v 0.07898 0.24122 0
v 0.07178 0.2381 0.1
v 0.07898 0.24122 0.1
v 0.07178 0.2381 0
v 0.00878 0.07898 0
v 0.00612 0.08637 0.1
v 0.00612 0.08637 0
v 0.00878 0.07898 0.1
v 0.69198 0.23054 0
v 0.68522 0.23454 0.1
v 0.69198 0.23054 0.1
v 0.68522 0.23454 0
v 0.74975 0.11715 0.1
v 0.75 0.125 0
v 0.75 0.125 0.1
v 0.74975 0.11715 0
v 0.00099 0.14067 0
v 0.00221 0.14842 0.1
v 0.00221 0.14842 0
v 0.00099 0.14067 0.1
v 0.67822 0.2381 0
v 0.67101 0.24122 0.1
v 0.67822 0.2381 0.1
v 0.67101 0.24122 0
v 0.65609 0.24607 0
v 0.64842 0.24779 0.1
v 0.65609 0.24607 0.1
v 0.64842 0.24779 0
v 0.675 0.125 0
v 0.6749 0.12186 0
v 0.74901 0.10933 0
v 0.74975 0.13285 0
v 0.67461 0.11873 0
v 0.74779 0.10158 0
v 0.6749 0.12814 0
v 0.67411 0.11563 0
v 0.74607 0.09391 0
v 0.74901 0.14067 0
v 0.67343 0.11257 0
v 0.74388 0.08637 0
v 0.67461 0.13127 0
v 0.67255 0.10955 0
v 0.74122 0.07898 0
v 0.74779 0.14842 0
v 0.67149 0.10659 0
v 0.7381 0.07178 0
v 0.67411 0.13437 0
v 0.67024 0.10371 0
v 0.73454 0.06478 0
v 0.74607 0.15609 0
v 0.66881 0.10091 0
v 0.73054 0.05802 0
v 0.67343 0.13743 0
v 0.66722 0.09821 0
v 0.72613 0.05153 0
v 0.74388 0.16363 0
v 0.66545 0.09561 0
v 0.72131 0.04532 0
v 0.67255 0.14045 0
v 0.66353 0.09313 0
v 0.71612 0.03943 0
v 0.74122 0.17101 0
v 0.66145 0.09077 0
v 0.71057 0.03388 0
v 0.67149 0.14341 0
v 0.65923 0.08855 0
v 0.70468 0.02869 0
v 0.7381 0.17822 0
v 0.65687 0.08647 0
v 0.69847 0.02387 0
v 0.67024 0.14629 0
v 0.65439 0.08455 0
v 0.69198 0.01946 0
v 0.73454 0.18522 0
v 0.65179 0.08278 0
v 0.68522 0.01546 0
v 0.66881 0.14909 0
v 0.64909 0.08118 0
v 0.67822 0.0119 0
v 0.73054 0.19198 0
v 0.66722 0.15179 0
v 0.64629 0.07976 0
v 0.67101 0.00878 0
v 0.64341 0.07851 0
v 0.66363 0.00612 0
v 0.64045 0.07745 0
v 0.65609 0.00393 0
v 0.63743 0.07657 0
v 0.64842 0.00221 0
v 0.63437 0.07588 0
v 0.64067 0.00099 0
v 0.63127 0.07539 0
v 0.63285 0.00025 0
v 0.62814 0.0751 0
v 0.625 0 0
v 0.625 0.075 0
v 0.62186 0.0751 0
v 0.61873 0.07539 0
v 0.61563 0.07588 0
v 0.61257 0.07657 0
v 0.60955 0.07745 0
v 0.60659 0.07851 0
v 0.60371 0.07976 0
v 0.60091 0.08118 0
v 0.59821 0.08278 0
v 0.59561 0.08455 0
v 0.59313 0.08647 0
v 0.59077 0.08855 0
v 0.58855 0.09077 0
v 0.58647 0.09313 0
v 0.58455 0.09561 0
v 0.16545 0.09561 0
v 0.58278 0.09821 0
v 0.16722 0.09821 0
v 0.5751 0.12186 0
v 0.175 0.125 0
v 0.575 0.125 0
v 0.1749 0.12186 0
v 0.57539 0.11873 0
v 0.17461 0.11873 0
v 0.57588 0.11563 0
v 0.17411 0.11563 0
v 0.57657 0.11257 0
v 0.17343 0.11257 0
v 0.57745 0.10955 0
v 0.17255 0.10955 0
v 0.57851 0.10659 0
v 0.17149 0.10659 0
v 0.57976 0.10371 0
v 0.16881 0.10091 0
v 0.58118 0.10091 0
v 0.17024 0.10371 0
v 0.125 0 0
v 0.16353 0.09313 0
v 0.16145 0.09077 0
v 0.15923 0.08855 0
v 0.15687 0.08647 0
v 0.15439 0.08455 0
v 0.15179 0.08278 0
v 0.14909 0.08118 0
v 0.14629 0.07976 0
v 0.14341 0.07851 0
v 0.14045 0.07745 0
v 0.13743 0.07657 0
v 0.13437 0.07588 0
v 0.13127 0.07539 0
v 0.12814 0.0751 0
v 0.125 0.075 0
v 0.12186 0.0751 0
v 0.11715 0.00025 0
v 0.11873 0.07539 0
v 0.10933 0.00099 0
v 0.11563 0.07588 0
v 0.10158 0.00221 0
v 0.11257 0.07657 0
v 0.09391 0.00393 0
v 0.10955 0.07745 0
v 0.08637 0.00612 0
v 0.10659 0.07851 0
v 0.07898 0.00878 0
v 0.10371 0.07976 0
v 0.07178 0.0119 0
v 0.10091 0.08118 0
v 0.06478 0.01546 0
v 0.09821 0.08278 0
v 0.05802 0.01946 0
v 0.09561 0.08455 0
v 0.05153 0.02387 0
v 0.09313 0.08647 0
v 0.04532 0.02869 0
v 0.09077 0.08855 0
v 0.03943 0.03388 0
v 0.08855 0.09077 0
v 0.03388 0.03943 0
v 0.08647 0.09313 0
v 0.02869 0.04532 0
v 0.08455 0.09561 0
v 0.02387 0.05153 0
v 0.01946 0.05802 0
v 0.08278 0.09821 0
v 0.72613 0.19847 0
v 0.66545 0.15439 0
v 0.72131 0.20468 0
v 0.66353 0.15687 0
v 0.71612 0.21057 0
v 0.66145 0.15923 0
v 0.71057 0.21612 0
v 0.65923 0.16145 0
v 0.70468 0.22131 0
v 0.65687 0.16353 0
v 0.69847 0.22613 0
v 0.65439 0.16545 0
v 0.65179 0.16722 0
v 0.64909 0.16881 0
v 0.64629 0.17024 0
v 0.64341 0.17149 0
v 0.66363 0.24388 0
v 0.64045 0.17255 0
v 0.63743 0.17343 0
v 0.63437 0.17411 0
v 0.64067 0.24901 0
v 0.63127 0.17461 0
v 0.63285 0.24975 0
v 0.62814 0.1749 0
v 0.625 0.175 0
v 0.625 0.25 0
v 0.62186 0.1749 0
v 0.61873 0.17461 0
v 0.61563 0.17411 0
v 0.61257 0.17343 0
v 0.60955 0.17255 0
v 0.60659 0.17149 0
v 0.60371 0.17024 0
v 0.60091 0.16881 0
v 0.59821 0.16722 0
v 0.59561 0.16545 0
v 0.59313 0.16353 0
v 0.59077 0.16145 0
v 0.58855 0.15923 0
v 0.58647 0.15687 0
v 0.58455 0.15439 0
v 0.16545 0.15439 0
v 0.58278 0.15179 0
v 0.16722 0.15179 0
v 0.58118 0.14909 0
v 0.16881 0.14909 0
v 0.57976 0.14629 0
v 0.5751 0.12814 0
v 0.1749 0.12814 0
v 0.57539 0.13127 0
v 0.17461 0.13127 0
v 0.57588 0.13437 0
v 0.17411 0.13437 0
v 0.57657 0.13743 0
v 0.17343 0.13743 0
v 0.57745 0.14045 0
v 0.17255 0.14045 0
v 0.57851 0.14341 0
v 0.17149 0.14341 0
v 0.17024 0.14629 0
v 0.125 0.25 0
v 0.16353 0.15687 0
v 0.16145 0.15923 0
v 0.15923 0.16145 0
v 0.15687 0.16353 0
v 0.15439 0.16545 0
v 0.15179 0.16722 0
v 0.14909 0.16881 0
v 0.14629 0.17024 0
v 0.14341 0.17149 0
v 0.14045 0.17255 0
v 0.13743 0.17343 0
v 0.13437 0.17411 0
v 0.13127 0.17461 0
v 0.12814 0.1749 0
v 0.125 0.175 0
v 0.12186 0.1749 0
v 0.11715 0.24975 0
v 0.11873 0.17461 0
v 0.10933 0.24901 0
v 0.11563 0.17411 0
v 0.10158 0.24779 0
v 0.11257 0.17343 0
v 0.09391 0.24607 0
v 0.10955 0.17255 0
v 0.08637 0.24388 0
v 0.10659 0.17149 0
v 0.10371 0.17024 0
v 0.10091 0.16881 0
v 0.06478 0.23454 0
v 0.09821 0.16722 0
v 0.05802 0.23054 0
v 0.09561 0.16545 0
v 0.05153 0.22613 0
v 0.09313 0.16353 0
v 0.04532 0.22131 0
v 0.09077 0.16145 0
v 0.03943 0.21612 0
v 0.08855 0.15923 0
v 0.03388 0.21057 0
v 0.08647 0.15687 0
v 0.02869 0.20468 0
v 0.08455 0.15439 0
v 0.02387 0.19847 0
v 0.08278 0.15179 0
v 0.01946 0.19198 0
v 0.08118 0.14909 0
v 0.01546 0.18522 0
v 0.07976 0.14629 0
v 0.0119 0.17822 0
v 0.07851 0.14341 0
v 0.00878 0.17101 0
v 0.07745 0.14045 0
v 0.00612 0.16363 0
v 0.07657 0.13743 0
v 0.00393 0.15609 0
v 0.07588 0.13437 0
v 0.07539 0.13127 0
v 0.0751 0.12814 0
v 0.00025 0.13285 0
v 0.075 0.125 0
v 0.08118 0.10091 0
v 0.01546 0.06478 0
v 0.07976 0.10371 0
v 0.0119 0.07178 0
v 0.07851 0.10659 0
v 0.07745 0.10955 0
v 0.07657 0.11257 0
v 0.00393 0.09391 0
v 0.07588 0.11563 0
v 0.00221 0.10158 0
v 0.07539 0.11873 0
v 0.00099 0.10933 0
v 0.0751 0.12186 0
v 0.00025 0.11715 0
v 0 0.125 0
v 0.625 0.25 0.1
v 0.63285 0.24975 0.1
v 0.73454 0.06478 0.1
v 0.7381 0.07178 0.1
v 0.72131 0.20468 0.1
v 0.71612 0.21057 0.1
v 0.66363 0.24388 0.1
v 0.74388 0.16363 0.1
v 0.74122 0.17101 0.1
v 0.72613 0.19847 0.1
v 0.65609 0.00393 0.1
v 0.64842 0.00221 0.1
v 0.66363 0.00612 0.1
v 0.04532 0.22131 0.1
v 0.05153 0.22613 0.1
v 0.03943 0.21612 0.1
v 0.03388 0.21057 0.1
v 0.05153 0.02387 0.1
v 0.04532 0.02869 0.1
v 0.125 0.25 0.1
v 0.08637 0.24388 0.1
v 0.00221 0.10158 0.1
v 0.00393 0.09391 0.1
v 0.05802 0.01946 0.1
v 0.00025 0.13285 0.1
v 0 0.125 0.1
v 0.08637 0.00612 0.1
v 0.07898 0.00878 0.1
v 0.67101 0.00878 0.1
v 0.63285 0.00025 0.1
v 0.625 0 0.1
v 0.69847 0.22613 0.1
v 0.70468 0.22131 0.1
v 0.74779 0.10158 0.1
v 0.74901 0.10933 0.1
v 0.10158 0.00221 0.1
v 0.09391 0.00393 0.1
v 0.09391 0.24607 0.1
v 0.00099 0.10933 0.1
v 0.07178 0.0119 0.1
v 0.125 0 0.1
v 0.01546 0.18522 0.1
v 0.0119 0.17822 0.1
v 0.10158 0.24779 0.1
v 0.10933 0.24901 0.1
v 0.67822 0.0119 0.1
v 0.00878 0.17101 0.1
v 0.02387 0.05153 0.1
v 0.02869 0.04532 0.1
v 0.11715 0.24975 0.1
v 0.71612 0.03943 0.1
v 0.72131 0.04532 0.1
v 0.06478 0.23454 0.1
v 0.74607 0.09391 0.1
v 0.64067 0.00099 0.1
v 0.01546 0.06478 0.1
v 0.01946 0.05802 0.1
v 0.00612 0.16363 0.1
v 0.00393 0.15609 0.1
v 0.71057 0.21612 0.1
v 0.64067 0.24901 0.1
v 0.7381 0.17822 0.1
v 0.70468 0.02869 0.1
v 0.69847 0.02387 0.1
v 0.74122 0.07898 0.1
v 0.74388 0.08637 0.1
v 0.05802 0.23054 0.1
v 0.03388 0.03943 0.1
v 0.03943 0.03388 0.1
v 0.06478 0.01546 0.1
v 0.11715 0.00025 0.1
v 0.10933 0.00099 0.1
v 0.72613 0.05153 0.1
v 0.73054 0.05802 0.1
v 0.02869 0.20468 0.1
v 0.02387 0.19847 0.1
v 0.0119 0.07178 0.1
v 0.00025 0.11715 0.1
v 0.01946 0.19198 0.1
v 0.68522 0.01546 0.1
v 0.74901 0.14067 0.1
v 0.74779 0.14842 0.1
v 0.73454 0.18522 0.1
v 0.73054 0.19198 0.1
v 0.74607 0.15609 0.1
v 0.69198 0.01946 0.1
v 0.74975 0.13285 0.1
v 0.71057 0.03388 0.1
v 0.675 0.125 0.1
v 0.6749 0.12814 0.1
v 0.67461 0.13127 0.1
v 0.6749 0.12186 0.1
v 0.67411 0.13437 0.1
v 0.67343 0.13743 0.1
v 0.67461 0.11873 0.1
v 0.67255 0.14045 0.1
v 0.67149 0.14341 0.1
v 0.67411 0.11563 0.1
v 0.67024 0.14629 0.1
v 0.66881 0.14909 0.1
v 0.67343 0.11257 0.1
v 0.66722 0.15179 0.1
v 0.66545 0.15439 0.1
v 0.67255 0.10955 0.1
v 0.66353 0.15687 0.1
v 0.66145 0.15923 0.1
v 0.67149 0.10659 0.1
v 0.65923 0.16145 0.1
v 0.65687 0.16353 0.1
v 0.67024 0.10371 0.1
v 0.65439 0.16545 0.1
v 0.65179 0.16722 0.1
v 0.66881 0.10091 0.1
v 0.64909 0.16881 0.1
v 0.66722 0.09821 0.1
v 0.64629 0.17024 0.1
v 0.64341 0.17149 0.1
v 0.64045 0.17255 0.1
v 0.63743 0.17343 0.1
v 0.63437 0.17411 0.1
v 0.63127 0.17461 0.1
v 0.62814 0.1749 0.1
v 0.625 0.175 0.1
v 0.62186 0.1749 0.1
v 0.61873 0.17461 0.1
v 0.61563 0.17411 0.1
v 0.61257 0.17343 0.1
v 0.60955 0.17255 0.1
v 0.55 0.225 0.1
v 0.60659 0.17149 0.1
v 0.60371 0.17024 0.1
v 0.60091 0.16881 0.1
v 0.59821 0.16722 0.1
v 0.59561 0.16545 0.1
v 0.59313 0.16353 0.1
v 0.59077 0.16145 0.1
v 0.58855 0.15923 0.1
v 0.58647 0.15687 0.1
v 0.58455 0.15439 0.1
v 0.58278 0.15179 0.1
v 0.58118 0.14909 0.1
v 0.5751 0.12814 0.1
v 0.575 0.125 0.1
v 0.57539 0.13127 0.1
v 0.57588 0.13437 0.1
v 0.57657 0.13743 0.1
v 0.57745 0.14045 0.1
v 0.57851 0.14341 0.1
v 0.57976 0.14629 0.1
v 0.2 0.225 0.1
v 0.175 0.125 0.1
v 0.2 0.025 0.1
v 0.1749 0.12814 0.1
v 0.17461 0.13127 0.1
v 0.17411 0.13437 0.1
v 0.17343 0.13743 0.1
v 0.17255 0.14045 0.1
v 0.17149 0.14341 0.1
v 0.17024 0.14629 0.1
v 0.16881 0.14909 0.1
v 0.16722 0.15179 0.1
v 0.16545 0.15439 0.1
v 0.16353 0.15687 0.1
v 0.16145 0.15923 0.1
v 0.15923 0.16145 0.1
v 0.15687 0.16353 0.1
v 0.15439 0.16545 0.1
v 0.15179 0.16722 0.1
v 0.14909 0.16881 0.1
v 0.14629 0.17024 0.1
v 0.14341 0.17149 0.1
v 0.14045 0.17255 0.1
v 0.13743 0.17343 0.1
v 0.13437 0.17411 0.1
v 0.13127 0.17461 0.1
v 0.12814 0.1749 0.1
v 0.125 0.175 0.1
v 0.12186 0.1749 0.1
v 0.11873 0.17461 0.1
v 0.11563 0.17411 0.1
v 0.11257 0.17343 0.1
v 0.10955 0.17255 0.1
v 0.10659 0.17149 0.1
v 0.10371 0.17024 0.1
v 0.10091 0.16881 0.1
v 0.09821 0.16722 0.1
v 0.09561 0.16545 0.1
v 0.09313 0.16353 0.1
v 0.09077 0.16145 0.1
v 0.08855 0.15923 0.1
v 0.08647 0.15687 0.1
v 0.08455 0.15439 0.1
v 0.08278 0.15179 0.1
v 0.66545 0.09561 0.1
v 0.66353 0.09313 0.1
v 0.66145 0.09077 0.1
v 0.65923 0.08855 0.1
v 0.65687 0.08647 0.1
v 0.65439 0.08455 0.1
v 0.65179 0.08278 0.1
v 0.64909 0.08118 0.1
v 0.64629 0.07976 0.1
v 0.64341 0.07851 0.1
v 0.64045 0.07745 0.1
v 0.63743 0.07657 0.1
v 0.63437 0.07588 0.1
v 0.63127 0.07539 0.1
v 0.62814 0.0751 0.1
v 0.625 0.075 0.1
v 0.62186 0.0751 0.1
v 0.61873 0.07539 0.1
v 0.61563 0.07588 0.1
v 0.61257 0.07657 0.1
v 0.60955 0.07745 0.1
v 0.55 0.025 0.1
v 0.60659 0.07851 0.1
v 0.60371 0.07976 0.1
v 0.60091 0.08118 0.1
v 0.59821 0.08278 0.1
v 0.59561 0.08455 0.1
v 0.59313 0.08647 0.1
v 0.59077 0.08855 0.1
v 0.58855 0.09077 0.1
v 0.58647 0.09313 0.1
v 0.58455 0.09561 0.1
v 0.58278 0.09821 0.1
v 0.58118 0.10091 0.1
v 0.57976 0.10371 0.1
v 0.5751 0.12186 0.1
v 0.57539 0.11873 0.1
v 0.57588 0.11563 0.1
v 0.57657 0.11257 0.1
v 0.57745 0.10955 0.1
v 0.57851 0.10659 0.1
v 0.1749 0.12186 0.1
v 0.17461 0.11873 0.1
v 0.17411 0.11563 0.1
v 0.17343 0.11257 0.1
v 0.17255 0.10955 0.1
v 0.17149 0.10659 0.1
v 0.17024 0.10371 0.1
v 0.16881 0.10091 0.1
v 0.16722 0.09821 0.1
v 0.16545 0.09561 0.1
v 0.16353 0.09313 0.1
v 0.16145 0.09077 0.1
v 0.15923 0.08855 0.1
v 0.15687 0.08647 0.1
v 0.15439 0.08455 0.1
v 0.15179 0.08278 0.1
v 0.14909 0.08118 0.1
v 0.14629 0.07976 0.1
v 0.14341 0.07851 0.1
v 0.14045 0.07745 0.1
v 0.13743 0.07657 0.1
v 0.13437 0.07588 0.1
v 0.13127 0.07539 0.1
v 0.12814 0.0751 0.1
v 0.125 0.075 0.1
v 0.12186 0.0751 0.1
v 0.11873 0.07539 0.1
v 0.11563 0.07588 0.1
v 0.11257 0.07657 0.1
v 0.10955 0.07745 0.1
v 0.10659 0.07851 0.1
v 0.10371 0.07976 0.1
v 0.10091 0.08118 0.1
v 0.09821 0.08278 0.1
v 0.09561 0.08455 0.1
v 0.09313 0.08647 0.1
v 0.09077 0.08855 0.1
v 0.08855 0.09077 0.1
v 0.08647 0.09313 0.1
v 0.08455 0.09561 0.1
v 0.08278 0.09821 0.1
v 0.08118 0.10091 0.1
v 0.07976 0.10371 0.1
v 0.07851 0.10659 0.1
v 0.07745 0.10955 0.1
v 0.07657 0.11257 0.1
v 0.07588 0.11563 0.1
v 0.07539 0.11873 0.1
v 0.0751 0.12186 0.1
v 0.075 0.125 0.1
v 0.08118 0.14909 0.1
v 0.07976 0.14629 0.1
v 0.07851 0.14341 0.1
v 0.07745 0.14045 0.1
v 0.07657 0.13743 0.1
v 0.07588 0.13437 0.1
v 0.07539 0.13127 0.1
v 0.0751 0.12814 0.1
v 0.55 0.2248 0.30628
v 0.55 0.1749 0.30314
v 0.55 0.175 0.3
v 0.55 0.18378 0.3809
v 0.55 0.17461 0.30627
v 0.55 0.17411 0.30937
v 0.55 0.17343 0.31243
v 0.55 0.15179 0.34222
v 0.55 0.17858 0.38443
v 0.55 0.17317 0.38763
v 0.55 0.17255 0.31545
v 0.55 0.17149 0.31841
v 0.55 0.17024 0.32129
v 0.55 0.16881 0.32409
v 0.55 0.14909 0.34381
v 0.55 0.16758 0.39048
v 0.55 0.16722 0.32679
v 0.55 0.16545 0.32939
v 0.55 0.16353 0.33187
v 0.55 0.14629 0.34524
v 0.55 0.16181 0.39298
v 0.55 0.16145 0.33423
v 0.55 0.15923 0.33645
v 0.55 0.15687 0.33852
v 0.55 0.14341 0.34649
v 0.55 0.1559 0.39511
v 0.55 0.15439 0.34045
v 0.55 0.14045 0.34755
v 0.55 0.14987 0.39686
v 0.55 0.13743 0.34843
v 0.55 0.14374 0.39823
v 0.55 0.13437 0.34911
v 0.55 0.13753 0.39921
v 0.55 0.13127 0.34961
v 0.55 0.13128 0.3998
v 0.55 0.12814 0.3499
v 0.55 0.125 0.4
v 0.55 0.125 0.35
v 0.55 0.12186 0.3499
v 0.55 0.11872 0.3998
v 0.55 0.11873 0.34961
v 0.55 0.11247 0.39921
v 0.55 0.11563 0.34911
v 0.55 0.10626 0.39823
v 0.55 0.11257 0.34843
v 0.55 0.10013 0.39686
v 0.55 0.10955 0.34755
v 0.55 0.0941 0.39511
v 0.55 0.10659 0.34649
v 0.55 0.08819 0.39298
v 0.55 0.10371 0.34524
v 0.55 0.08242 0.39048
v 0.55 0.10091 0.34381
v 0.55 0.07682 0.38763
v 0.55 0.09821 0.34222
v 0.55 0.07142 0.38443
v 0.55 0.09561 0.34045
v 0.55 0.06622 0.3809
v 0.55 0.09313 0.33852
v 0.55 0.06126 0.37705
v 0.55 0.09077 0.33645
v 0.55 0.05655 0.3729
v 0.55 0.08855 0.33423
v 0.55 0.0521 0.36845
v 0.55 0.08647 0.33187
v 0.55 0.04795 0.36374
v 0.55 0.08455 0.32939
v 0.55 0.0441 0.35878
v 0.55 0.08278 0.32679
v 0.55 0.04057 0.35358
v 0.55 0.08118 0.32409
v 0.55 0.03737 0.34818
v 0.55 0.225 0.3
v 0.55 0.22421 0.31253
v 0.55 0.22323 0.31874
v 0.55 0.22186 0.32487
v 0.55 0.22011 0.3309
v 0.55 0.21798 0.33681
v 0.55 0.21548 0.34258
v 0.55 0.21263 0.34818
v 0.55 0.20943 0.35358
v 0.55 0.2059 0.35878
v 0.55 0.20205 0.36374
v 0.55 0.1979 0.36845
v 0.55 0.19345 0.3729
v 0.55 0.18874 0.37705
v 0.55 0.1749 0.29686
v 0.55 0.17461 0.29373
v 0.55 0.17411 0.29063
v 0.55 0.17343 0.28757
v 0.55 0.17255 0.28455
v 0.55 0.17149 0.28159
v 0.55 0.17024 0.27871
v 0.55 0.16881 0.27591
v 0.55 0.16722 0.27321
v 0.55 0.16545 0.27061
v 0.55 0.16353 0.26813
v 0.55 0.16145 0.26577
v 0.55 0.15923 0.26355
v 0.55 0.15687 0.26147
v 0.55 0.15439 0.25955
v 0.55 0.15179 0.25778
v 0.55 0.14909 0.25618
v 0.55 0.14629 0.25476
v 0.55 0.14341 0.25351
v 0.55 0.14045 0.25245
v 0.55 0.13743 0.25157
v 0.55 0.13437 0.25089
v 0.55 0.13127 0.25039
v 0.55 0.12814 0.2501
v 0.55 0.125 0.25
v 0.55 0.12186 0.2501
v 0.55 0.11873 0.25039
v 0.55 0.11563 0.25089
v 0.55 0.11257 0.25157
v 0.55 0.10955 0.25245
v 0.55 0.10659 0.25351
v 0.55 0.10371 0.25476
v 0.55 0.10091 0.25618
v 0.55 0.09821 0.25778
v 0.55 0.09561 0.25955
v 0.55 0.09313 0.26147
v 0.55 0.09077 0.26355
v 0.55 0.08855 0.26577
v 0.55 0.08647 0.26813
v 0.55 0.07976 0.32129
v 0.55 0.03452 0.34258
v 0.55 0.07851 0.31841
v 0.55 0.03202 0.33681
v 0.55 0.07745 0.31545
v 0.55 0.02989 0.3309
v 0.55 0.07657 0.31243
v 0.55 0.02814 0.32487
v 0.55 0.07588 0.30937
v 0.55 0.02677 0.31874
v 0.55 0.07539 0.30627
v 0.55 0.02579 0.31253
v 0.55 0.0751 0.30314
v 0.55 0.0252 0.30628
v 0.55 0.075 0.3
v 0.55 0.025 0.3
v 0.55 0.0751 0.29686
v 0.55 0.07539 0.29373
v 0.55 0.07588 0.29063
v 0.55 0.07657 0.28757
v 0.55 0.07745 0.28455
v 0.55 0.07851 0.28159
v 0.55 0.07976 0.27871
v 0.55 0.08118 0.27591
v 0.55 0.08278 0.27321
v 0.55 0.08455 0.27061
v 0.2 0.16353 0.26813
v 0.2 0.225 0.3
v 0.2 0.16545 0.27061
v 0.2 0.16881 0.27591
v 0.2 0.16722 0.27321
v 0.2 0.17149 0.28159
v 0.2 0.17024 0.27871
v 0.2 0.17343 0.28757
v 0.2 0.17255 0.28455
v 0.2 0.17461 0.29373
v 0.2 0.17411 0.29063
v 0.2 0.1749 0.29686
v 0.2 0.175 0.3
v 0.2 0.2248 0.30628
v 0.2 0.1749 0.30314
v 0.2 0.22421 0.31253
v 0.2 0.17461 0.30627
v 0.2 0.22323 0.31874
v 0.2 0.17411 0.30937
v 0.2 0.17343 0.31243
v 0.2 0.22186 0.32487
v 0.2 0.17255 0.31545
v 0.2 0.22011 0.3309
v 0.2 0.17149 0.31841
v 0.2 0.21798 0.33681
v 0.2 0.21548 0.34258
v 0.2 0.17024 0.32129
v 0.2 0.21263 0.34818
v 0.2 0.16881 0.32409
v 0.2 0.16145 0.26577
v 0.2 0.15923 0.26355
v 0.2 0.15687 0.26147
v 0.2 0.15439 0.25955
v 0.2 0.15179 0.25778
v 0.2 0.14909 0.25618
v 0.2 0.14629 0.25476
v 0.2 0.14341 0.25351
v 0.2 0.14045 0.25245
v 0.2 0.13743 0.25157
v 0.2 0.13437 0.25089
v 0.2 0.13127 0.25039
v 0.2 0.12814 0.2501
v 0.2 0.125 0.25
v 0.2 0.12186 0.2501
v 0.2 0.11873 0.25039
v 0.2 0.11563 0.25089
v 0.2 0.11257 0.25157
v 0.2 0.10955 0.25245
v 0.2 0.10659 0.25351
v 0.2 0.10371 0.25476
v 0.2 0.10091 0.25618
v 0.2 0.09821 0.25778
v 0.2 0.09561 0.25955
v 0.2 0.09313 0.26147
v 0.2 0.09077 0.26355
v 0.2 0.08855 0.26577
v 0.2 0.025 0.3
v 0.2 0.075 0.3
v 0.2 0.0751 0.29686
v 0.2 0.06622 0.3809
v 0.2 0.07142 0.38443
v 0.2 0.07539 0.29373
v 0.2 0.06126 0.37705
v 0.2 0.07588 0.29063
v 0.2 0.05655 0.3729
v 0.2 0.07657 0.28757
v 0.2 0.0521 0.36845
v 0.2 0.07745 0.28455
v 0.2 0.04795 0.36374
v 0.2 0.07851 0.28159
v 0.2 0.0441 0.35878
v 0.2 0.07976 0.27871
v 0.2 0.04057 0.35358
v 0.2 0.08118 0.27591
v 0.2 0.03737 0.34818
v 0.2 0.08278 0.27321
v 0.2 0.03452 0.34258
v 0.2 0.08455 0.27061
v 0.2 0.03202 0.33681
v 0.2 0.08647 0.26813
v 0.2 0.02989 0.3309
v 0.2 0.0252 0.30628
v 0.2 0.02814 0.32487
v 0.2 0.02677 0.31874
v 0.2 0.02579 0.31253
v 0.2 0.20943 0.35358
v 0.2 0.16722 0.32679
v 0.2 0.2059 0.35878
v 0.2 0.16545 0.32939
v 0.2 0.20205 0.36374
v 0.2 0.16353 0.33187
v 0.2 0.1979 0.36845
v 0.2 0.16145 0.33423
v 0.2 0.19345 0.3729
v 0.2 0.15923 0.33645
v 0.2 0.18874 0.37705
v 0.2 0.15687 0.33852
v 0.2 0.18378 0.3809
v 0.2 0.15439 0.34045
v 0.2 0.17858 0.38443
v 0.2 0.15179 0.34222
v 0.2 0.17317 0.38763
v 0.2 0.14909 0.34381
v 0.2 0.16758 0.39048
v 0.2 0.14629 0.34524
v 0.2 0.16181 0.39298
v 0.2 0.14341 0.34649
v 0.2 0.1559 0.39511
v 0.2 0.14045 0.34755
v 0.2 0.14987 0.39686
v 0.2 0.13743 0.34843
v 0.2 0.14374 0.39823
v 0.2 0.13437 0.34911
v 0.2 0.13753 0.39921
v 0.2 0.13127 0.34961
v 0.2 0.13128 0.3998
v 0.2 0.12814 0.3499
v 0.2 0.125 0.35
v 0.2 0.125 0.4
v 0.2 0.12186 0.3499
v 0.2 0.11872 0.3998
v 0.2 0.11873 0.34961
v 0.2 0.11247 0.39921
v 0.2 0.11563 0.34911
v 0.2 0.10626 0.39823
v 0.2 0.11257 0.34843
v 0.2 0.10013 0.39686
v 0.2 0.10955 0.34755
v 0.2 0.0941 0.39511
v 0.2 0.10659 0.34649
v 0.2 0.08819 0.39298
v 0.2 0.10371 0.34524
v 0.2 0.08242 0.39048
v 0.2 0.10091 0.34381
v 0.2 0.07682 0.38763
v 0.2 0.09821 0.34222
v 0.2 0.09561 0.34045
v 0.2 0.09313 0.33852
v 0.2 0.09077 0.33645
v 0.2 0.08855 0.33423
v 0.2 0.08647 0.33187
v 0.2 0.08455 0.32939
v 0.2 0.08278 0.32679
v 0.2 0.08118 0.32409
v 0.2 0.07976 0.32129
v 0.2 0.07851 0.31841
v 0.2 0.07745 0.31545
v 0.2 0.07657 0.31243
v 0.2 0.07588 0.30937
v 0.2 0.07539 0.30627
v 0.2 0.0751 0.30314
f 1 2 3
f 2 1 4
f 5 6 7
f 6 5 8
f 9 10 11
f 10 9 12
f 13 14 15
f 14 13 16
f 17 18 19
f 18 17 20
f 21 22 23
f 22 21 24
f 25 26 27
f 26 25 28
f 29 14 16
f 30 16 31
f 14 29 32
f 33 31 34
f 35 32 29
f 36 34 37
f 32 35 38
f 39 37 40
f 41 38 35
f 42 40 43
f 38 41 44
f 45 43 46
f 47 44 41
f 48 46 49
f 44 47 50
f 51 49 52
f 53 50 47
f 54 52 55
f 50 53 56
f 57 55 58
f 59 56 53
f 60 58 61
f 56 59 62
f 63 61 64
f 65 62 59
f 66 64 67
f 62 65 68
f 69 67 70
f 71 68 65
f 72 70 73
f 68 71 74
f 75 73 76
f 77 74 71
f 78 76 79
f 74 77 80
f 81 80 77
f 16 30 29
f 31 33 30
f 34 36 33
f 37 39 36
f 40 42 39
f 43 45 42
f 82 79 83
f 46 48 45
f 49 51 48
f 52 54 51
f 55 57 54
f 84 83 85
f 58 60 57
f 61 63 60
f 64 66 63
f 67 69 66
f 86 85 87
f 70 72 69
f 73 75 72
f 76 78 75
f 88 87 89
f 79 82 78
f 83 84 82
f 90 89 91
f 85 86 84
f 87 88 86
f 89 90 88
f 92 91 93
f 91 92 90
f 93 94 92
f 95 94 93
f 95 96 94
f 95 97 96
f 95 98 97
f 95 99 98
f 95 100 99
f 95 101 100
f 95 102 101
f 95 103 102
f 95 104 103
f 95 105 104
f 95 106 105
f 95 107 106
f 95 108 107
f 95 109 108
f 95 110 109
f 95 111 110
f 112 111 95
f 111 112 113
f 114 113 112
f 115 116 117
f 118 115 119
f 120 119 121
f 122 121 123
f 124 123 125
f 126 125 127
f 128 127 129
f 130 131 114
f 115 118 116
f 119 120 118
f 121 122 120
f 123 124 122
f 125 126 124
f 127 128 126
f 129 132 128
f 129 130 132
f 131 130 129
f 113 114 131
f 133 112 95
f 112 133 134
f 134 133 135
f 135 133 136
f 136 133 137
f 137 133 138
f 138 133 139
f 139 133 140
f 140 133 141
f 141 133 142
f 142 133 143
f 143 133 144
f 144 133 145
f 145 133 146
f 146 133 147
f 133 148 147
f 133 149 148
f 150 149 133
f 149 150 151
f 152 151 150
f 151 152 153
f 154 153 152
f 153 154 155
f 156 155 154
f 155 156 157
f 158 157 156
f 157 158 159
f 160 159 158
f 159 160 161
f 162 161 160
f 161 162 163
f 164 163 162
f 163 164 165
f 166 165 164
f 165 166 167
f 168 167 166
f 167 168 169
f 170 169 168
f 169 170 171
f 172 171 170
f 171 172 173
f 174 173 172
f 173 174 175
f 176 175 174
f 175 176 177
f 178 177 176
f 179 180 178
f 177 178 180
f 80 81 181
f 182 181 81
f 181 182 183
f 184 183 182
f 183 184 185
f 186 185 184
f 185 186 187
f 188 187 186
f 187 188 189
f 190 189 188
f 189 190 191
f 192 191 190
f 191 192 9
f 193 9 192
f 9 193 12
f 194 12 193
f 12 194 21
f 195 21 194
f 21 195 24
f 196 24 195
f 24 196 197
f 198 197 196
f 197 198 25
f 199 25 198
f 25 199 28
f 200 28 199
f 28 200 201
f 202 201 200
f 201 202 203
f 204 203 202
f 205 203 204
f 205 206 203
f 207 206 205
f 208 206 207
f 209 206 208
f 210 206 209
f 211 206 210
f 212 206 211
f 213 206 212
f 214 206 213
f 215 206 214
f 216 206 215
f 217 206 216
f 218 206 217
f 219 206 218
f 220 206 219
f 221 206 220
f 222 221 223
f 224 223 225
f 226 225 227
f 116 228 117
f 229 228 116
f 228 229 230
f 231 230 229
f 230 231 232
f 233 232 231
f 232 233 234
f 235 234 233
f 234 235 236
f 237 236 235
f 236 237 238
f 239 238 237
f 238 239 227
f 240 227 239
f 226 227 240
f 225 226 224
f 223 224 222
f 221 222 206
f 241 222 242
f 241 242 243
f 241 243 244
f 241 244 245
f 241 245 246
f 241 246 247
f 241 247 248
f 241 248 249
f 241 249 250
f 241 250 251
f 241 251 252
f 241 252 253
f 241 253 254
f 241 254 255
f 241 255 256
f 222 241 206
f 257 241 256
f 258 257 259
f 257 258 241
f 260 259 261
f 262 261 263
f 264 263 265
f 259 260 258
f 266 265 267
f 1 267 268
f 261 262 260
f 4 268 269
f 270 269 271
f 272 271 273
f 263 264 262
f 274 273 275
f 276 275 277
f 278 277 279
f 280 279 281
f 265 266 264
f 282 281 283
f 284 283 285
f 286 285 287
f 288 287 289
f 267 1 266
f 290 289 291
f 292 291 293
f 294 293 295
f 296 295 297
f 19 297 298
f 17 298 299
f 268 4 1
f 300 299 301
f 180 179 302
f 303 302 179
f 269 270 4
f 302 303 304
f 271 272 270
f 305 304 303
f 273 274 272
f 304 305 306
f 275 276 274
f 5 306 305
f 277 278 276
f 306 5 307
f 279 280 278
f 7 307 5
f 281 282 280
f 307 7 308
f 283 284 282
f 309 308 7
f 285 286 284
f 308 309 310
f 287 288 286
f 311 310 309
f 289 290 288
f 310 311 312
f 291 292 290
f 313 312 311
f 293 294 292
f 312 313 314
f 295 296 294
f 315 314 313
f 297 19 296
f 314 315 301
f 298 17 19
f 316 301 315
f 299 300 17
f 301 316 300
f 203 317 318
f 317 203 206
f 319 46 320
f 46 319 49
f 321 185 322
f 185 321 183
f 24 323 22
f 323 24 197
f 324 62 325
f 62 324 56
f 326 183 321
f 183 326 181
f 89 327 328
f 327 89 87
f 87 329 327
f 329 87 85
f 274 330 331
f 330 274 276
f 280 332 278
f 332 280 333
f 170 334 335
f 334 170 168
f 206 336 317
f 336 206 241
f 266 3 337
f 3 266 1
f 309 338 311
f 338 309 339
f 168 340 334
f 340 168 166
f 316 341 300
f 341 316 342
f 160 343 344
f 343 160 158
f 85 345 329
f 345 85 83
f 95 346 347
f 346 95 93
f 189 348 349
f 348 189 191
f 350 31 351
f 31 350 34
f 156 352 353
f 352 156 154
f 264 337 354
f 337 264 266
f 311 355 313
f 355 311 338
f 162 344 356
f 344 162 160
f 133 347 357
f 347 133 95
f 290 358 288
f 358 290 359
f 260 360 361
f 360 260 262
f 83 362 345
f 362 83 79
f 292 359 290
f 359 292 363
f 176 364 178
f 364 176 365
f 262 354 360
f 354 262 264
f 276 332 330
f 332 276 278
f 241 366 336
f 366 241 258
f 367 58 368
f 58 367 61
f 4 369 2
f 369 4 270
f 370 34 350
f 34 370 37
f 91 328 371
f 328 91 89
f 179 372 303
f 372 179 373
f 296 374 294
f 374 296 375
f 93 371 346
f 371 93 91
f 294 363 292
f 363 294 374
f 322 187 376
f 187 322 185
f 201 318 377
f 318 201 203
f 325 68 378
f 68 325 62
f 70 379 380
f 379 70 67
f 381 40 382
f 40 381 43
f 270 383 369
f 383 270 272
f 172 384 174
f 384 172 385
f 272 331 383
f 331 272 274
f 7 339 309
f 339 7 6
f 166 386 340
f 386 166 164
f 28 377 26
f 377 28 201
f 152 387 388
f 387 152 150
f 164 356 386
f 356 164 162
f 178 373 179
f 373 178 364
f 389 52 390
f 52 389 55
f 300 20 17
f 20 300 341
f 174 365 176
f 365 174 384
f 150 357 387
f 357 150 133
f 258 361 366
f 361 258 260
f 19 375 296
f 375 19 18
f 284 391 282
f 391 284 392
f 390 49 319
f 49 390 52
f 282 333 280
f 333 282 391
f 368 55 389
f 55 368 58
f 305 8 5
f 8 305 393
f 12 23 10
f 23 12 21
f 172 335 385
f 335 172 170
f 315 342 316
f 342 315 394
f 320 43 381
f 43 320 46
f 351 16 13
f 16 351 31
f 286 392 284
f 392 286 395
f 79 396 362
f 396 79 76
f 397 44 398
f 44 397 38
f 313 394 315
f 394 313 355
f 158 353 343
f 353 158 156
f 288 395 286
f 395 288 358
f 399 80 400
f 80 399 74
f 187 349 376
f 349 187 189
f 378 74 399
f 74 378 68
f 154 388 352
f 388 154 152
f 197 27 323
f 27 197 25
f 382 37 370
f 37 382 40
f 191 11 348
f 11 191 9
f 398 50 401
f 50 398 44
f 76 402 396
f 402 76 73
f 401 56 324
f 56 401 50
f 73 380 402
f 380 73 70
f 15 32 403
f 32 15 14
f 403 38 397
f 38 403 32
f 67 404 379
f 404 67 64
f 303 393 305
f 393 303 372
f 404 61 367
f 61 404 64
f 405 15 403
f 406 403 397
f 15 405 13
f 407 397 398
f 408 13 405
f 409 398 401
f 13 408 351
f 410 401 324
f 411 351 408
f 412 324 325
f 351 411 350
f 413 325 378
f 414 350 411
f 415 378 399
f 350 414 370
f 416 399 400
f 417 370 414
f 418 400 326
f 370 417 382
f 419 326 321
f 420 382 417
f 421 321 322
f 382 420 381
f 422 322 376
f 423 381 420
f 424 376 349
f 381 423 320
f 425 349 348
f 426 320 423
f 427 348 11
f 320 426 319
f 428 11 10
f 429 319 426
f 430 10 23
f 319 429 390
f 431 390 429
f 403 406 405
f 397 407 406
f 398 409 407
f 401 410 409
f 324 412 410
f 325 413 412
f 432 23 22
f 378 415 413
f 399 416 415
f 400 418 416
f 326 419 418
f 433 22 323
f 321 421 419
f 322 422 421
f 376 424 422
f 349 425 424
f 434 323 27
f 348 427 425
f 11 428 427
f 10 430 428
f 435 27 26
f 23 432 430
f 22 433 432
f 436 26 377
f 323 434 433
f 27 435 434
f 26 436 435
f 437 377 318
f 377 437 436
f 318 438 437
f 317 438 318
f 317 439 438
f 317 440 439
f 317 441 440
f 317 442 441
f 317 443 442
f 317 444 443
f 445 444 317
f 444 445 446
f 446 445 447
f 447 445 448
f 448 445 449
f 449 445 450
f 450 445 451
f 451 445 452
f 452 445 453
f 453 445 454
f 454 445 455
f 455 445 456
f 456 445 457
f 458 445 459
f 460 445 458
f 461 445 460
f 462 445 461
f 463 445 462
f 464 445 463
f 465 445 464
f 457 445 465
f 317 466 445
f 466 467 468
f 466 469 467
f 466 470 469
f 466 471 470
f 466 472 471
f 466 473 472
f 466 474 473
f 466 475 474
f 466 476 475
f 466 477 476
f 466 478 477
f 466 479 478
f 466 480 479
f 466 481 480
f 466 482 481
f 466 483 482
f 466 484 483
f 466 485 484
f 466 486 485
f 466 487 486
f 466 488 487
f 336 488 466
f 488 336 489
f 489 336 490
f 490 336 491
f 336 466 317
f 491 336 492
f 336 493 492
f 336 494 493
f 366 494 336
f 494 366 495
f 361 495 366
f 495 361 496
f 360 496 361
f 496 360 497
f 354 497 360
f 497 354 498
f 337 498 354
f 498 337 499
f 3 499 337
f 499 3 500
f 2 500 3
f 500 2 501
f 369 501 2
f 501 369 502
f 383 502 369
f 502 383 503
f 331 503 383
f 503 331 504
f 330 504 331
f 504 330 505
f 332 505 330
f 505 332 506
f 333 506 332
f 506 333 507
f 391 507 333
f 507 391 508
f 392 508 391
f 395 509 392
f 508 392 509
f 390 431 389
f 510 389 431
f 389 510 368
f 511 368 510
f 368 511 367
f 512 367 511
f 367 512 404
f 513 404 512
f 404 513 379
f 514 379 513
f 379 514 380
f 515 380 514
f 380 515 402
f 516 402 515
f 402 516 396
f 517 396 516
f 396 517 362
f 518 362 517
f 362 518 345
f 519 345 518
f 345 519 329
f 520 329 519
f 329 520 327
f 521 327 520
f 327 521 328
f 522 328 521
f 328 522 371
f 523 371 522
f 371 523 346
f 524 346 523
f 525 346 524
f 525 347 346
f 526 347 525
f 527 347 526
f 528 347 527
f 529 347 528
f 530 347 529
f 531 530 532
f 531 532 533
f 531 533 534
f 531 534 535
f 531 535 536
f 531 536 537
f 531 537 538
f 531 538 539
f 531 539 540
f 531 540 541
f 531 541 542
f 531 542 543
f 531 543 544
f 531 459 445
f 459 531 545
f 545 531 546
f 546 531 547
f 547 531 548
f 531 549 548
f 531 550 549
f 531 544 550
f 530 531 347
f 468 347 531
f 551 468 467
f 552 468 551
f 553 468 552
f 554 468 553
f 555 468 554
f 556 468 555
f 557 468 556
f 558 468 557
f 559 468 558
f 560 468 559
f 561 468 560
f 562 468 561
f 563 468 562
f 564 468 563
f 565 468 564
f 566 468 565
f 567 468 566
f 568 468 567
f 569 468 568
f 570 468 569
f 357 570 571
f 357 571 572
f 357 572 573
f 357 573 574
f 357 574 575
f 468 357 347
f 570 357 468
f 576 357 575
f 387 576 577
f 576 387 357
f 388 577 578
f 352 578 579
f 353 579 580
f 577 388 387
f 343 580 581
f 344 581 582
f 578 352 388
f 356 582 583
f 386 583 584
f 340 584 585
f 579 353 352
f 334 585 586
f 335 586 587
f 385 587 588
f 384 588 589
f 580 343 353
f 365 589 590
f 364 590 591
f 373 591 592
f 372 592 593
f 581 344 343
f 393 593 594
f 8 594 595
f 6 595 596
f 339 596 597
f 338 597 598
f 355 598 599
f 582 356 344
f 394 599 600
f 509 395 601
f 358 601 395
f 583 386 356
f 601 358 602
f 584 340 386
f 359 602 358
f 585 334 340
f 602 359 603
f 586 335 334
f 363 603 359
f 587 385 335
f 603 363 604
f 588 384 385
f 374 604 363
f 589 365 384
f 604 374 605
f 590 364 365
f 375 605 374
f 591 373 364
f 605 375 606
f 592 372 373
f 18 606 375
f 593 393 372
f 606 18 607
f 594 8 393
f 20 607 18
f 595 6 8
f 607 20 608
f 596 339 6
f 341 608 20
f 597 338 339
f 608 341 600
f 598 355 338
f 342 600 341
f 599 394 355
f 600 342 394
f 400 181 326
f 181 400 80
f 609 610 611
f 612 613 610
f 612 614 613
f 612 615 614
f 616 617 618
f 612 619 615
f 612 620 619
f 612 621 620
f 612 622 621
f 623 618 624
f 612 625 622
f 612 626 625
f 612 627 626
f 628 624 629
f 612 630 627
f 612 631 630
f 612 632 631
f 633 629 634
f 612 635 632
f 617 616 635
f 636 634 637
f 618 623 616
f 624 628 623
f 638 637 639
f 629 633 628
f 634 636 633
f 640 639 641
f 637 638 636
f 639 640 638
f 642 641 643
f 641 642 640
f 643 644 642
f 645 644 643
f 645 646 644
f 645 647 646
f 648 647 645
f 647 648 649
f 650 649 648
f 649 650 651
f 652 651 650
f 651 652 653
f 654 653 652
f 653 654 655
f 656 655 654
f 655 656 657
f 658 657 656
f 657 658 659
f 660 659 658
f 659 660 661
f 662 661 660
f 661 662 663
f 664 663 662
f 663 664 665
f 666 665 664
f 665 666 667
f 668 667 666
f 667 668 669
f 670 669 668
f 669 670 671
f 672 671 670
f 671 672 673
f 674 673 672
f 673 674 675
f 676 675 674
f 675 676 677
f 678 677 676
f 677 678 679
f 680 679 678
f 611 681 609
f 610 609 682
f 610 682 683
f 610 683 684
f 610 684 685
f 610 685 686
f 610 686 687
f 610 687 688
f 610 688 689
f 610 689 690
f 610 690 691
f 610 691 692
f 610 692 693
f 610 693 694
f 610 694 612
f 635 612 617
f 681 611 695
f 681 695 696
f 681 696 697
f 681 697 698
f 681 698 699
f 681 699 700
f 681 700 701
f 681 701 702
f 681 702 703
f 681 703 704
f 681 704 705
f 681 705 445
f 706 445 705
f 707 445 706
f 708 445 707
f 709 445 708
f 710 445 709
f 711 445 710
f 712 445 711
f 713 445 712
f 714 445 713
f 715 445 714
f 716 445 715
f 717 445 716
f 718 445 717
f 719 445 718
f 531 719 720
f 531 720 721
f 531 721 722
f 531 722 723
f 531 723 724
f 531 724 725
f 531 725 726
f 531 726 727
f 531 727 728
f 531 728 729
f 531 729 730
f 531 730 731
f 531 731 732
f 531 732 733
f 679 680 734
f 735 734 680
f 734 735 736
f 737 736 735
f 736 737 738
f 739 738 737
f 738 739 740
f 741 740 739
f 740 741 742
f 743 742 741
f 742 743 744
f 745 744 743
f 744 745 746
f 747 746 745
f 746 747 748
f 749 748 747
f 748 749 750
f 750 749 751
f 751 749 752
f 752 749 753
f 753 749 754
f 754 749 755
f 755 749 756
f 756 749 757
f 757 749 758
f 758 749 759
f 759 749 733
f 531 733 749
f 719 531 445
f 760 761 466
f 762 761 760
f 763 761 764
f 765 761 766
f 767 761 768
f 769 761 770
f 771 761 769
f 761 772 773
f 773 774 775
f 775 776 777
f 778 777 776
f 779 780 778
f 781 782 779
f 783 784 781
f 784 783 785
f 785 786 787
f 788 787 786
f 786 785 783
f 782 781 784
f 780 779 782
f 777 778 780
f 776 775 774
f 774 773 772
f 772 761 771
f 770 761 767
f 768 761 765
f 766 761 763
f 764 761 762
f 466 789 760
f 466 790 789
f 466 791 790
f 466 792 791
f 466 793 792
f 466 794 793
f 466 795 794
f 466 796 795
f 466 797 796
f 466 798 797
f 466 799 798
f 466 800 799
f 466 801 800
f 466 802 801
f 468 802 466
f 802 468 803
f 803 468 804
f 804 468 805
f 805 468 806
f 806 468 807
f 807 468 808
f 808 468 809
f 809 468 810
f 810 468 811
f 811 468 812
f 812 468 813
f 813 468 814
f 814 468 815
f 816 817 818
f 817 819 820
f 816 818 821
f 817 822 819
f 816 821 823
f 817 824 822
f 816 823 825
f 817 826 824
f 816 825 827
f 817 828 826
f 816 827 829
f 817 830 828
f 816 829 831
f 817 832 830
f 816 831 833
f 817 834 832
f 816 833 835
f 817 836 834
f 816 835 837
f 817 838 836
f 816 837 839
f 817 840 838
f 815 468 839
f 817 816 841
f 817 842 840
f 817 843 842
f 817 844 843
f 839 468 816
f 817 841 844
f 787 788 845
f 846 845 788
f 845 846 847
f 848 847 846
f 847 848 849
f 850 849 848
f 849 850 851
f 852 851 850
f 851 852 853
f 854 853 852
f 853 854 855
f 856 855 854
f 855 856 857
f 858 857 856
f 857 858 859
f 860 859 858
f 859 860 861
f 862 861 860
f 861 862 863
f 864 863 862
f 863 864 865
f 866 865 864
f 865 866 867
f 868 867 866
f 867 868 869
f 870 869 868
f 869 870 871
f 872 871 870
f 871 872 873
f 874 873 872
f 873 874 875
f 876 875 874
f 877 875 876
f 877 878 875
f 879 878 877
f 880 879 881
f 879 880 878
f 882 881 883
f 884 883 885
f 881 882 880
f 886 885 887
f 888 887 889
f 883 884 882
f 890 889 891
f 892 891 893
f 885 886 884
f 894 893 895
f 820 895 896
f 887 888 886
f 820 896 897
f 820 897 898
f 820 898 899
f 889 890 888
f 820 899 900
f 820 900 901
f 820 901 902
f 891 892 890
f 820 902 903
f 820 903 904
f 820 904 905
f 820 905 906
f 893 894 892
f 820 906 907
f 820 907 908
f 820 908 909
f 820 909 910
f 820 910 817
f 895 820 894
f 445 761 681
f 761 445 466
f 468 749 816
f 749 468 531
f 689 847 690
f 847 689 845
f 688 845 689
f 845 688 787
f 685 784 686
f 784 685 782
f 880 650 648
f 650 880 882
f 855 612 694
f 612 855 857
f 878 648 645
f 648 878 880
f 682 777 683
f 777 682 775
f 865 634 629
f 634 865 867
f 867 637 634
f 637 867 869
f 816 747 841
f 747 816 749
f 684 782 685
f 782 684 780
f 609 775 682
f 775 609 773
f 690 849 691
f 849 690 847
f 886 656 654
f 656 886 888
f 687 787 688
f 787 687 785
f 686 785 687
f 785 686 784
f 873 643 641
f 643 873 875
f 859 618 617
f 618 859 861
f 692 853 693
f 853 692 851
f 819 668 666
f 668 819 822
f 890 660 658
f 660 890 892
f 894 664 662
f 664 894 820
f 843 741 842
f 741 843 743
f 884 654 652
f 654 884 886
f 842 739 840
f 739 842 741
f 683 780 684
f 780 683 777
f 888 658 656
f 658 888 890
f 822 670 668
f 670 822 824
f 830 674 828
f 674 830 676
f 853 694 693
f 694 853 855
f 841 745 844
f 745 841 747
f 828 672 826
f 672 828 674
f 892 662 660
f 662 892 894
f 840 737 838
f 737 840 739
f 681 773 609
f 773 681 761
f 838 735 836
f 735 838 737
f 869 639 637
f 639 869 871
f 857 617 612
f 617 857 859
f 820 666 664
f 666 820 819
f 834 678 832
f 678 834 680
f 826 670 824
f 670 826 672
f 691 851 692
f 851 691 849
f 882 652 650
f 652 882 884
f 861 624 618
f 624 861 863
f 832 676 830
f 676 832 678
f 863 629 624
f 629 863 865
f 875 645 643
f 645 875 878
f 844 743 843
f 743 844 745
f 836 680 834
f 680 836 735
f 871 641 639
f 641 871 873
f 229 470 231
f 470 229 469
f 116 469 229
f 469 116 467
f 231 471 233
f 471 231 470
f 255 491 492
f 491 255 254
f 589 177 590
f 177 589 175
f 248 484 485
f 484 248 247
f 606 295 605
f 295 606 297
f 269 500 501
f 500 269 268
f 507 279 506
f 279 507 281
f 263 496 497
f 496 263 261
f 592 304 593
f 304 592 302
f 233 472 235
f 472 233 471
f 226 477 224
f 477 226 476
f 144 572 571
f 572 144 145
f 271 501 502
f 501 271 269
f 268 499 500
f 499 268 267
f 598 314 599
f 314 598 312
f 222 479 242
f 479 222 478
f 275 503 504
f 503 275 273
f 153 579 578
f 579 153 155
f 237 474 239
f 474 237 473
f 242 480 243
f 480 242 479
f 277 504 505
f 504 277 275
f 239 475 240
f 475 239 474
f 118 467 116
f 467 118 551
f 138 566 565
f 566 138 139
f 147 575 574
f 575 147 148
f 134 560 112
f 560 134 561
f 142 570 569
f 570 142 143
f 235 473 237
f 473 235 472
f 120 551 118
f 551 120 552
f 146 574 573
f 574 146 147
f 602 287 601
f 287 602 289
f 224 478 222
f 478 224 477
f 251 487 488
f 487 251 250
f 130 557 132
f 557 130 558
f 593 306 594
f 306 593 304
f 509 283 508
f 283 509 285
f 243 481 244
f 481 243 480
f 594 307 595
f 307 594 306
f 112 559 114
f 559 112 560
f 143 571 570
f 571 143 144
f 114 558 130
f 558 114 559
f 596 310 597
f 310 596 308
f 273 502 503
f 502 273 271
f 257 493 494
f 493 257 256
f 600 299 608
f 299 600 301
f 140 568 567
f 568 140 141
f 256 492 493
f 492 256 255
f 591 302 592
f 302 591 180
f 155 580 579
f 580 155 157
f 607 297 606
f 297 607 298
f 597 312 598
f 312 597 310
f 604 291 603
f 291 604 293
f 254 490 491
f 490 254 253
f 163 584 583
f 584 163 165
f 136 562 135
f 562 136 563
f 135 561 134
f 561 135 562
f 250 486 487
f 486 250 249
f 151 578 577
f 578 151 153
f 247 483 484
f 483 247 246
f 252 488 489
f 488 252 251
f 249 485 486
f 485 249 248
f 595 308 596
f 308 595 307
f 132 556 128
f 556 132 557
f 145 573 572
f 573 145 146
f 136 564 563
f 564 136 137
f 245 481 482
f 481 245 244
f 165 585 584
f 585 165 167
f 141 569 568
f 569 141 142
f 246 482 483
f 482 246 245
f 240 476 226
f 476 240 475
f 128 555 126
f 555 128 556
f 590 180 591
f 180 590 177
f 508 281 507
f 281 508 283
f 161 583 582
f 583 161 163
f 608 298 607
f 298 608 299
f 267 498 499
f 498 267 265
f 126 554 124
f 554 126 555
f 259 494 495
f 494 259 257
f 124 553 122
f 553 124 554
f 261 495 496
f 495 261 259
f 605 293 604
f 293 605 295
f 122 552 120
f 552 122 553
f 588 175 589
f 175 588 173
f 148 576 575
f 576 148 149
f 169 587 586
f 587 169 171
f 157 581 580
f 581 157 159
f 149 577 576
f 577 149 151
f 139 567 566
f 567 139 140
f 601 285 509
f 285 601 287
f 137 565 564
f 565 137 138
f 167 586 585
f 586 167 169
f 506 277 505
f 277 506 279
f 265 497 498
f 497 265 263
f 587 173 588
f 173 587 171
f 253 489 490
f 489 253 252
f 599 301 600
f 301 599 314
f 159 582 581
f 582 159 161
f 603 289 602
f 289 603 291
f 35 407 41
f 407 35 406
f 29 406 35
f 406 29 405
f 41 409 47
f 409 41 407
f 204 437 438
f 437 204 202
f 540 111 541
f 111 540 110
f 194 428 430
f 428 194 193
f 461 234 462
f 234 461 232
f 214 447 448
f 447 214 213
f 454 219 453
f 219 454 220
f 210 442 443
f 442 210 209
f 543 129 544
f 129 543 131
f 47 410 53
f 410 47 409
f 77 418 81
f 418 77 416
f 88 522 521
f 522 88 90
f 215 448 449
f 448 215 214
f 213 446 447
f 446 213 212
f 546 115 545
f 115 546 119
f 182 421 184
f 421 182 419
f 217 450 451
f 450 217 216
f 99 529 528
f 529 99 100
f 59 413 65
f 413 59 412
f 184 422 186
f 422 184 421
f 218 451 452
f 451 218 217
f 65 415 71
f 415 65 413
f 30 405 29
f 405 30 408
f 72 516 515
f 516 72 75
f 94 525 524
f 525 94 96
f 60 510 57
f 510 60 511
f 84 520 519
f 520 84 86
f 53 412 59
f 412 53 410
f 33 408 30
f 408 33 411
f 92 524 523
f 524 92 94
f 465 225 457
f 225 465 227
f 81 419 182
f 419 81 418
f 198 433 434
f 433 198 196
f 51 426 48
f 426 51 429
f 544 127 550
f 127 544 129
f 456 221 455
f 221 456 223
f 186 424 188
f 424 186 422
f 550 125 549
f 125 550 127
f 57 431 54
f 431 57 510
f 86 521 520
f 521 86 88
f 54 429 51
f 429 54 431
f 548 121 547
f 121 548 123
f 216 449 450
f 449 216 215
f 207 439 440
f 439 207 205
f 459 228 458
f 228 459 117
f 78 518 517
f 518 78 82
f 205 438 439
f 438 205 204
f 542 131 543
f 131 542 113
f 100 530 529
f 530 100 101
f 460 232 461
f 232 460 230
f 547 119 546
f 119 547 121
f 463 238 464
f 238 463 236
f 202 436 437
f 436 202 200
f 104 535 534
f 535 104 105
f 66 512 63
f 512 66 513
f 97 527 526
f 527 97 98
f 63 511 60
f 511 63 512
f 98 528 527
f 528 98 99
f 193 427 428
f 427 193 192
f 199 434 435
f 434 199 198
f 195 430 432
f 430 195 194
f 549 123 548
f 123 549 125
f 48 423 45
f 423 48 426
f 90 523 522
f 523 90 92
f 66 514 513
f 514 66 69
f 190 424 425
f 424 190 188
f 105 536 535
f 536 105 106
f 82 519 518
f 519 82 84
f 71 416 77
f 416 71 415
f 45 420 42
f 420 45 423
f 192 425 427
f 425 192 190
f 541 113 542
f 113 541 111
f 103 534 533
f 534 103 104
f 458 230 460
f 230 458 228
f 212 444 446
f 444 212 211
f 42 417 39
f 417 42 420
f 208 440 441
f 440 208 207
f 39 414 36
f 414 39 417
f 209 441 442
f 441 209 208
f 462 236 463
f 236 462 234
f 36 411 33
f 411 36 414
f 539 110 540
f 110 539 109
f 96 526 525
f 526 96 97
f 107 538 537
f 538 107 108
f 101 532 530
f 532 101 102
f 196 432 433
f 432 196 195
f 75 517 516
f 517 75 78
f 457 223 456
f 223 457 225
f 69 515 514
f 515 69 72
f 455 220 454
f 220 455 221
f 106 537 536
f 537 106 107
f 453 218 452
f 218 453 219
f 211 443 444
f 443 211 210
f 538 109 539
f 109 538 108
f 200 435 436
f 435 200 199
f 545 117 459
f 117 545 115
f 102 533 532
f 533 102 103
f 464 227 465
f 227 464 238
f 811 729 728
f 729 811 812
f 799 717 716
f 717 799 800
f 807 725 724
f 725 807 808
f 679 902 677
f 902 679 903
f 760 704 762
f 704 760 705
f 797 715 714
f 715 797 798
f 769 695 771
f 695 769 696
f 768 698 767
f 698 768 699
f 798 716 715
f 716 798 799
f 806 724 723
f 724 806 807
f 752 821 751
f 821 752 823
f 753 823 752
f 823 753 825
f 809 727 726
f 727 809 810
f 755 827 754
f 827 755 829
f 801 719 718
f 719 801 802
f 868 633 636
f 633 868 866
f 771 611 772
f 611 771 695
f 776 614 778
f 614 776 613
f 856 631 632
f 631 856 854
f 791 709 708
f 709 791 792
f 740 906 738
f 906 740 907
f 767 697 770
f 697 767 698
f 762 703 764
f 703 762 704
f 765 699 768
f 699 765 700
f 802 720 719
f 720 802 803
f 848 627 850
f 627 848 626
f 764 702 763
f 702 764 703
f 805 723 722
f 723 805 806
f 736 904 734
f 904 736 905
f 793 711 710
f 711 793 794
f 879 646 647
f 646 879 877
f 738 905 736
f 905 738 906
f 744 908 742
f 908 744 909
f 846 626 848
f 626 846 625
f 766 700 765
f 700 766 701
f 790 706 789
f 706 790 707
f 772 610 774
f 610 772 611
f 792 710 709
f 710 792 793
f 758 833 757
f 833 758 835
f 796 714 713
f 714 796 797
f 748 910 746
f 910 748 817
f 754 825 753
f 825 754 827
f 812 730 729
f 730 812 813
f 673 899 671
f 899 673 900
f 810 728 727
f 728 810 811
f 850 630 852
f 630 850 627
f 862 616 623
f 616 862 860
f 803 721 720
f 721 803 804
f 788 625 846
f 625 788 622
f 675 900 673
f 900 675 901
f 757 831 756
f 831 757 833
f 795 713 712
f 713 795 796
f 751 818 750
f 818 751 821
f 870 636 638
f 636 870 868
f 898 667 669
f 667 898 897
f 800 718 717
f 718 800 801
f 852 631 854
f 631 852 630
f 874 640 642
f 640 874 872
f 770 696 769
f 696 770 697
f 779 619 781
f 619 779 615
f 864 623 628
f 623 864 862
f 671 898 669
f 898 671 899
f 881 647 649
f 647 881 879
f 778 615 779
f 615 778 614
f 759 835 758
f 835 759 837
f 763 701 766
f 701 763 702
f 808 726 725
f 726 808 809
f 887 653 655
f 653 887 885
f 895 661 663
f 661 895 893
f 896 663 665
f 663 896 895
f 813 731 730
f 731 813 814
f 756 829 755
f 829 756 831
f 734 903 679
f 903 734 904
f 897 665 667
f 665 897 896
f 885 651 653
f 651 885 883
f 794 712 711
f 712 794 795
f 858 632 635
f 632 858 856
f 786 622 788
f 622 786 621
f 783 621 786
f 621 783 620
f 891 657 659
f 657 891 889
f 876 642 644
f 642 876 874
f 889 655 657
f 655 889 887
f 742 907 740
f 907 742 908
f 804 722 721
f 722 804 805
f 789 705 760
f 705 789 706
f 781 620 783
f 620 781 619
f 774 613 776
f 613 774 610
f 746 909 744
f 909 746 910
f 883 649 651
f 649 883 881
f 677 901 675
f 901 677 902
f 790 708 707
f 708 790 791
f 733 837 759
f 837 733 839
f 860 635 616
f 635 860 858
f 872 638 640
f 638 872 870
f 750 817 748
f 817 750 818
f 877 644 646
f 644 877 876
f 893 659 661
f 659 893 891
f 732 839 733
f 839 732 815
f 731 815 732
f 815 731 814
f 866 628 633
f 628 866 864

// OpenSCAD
// Parameters for CAD Model
$fn = 100; // High resolution for smooth curves
epsilon = 0.01; // Small overlap for clean boolean operations

// Base Slab Parameters
base_length = 0.75;
base_width = 0.25;
base_thickness = 0.1;
base_radius = base_width / 2; // 0.125
base_center_left_x = 0.125;
base_center_right_x = 0.625;
base_center_y = 0.125;

// Base Holes Parameters
hole_radius = 0.05;

// Lower Upright Parameters
upright_length = 0.35;
upright_width = 0.2;
upright_height = 0.2;
upright_x_offset = 0.2;
upright_y_offset = 0.025;
upright_z_offset = base_thickness; // 0.1

// Rounded Cap Parameters
cap_radius = 0.1; // Semicircular profile spanning 0.2 width
cap_length = upright_length; // 0.35
cap_x = upright_x_offset; // 0.2
cap_y = upright_y_offset + cap_radius; // 0.125
cap_z = upright_z_offset + upright_height; // 0.3

// Upright Through-Passage Parameters
passage_radius = 0.05;
passage_x_start = 0.2;
passage_length = 0.444;
passage_y = 0.125;
passage_z = 0.3; // Centered in vertical band 0.25 to 0.35

// Rounded Upper Relief Parameters
relief_width = 0.24; // Lengthwise span
relief_radius = relief_width / 2; // 0.12
relief_x_center = 0.255 + relief_radius; // 0.375
relief_y_start = 0.025;
relief_y_length = 0.299; // Transverse reach
relief_z_bottom = 0.18;
relief_z_center = relief_z_bottom + relief_radius; // 0.30
relief_z_top = 0.45;

// --- Modules ---

// 1. Main base slab (obround shape)
module base_slab() {
    hull() {
        translate([base_center_left_x, base_center_y, 0])
            cylinder(h=base_thickness, r=base_radius);
        translate([base_center_right_x, base_center_y, 0])
            cylinder(h=base_thickness, r=base_radius);
    }
}

// 2. Vertical through openings in the base
module base_holes() {
    translate([base_center_left_x, base_center_y, -epsilon])
        cylinder(h=base_thickness + 2*epsilon, r=hole_radius);
    
    translate([base_center_right_x, base_center_y, -epsilon])
        cylinder(h=base_thickness + 2*epsilon, r=hole_radius);
}

// 3. Rectangular lower upright
module lower_upright() {
    translate([upright_x_offset, upright_y_offset, upright_z_offset])
        cube([upright_length, upright_width, upright_height]);
}

// 4. Solid rounded cap over the upright
// Modeled as a full cylinder; the bottom half merges into the upright
module rounded_cap() {
    translate([cap_x, cap_y, cap_z])
        rotate([0, 90, 0])
        cylinder(h=cap_length, r=cap_radius);
}

// 5. Horizontal circular through-passage
module upright_passage() {
    translate([passage_x_start - epsilon, passage_y, passage_z])
        rotate([0, 90, 0])
        cylinder(h=passage_length + 2*epsilon, r=passage_radius);
}

// 6. Rounded upper relief (U-shaped cut extruded along Y axis)
module upper_relief() {
    translate([0, relief_y_start - epsilon, 0])
        rotate([-90, 0, 0]) // Rotates the 2D XZ profile to extrude along Y
        linear_extrude(height=relief_y_length + 2*epsilon)
        hull() {
            // Semicircular bottom of the relief
            translate([relief_x_center, relief_z_center])
                circle(r=relief_radius);
            // Straight vertical section extending to the top
            translate([relief_x_center - relief_radius, relief_z_center])
                square([relief_width, relief_z_top - relief_z_center + epsilon]);
        }
}

// --- Main Model Assembly ---

difference() {
    // Additive geometry
    union() {
        base_slab();
        lower_upright();
        rounded_cap();
    }
    
    // Subtractive geometry
    base_holes();
    upright_passage();
    upper_relief();
}
